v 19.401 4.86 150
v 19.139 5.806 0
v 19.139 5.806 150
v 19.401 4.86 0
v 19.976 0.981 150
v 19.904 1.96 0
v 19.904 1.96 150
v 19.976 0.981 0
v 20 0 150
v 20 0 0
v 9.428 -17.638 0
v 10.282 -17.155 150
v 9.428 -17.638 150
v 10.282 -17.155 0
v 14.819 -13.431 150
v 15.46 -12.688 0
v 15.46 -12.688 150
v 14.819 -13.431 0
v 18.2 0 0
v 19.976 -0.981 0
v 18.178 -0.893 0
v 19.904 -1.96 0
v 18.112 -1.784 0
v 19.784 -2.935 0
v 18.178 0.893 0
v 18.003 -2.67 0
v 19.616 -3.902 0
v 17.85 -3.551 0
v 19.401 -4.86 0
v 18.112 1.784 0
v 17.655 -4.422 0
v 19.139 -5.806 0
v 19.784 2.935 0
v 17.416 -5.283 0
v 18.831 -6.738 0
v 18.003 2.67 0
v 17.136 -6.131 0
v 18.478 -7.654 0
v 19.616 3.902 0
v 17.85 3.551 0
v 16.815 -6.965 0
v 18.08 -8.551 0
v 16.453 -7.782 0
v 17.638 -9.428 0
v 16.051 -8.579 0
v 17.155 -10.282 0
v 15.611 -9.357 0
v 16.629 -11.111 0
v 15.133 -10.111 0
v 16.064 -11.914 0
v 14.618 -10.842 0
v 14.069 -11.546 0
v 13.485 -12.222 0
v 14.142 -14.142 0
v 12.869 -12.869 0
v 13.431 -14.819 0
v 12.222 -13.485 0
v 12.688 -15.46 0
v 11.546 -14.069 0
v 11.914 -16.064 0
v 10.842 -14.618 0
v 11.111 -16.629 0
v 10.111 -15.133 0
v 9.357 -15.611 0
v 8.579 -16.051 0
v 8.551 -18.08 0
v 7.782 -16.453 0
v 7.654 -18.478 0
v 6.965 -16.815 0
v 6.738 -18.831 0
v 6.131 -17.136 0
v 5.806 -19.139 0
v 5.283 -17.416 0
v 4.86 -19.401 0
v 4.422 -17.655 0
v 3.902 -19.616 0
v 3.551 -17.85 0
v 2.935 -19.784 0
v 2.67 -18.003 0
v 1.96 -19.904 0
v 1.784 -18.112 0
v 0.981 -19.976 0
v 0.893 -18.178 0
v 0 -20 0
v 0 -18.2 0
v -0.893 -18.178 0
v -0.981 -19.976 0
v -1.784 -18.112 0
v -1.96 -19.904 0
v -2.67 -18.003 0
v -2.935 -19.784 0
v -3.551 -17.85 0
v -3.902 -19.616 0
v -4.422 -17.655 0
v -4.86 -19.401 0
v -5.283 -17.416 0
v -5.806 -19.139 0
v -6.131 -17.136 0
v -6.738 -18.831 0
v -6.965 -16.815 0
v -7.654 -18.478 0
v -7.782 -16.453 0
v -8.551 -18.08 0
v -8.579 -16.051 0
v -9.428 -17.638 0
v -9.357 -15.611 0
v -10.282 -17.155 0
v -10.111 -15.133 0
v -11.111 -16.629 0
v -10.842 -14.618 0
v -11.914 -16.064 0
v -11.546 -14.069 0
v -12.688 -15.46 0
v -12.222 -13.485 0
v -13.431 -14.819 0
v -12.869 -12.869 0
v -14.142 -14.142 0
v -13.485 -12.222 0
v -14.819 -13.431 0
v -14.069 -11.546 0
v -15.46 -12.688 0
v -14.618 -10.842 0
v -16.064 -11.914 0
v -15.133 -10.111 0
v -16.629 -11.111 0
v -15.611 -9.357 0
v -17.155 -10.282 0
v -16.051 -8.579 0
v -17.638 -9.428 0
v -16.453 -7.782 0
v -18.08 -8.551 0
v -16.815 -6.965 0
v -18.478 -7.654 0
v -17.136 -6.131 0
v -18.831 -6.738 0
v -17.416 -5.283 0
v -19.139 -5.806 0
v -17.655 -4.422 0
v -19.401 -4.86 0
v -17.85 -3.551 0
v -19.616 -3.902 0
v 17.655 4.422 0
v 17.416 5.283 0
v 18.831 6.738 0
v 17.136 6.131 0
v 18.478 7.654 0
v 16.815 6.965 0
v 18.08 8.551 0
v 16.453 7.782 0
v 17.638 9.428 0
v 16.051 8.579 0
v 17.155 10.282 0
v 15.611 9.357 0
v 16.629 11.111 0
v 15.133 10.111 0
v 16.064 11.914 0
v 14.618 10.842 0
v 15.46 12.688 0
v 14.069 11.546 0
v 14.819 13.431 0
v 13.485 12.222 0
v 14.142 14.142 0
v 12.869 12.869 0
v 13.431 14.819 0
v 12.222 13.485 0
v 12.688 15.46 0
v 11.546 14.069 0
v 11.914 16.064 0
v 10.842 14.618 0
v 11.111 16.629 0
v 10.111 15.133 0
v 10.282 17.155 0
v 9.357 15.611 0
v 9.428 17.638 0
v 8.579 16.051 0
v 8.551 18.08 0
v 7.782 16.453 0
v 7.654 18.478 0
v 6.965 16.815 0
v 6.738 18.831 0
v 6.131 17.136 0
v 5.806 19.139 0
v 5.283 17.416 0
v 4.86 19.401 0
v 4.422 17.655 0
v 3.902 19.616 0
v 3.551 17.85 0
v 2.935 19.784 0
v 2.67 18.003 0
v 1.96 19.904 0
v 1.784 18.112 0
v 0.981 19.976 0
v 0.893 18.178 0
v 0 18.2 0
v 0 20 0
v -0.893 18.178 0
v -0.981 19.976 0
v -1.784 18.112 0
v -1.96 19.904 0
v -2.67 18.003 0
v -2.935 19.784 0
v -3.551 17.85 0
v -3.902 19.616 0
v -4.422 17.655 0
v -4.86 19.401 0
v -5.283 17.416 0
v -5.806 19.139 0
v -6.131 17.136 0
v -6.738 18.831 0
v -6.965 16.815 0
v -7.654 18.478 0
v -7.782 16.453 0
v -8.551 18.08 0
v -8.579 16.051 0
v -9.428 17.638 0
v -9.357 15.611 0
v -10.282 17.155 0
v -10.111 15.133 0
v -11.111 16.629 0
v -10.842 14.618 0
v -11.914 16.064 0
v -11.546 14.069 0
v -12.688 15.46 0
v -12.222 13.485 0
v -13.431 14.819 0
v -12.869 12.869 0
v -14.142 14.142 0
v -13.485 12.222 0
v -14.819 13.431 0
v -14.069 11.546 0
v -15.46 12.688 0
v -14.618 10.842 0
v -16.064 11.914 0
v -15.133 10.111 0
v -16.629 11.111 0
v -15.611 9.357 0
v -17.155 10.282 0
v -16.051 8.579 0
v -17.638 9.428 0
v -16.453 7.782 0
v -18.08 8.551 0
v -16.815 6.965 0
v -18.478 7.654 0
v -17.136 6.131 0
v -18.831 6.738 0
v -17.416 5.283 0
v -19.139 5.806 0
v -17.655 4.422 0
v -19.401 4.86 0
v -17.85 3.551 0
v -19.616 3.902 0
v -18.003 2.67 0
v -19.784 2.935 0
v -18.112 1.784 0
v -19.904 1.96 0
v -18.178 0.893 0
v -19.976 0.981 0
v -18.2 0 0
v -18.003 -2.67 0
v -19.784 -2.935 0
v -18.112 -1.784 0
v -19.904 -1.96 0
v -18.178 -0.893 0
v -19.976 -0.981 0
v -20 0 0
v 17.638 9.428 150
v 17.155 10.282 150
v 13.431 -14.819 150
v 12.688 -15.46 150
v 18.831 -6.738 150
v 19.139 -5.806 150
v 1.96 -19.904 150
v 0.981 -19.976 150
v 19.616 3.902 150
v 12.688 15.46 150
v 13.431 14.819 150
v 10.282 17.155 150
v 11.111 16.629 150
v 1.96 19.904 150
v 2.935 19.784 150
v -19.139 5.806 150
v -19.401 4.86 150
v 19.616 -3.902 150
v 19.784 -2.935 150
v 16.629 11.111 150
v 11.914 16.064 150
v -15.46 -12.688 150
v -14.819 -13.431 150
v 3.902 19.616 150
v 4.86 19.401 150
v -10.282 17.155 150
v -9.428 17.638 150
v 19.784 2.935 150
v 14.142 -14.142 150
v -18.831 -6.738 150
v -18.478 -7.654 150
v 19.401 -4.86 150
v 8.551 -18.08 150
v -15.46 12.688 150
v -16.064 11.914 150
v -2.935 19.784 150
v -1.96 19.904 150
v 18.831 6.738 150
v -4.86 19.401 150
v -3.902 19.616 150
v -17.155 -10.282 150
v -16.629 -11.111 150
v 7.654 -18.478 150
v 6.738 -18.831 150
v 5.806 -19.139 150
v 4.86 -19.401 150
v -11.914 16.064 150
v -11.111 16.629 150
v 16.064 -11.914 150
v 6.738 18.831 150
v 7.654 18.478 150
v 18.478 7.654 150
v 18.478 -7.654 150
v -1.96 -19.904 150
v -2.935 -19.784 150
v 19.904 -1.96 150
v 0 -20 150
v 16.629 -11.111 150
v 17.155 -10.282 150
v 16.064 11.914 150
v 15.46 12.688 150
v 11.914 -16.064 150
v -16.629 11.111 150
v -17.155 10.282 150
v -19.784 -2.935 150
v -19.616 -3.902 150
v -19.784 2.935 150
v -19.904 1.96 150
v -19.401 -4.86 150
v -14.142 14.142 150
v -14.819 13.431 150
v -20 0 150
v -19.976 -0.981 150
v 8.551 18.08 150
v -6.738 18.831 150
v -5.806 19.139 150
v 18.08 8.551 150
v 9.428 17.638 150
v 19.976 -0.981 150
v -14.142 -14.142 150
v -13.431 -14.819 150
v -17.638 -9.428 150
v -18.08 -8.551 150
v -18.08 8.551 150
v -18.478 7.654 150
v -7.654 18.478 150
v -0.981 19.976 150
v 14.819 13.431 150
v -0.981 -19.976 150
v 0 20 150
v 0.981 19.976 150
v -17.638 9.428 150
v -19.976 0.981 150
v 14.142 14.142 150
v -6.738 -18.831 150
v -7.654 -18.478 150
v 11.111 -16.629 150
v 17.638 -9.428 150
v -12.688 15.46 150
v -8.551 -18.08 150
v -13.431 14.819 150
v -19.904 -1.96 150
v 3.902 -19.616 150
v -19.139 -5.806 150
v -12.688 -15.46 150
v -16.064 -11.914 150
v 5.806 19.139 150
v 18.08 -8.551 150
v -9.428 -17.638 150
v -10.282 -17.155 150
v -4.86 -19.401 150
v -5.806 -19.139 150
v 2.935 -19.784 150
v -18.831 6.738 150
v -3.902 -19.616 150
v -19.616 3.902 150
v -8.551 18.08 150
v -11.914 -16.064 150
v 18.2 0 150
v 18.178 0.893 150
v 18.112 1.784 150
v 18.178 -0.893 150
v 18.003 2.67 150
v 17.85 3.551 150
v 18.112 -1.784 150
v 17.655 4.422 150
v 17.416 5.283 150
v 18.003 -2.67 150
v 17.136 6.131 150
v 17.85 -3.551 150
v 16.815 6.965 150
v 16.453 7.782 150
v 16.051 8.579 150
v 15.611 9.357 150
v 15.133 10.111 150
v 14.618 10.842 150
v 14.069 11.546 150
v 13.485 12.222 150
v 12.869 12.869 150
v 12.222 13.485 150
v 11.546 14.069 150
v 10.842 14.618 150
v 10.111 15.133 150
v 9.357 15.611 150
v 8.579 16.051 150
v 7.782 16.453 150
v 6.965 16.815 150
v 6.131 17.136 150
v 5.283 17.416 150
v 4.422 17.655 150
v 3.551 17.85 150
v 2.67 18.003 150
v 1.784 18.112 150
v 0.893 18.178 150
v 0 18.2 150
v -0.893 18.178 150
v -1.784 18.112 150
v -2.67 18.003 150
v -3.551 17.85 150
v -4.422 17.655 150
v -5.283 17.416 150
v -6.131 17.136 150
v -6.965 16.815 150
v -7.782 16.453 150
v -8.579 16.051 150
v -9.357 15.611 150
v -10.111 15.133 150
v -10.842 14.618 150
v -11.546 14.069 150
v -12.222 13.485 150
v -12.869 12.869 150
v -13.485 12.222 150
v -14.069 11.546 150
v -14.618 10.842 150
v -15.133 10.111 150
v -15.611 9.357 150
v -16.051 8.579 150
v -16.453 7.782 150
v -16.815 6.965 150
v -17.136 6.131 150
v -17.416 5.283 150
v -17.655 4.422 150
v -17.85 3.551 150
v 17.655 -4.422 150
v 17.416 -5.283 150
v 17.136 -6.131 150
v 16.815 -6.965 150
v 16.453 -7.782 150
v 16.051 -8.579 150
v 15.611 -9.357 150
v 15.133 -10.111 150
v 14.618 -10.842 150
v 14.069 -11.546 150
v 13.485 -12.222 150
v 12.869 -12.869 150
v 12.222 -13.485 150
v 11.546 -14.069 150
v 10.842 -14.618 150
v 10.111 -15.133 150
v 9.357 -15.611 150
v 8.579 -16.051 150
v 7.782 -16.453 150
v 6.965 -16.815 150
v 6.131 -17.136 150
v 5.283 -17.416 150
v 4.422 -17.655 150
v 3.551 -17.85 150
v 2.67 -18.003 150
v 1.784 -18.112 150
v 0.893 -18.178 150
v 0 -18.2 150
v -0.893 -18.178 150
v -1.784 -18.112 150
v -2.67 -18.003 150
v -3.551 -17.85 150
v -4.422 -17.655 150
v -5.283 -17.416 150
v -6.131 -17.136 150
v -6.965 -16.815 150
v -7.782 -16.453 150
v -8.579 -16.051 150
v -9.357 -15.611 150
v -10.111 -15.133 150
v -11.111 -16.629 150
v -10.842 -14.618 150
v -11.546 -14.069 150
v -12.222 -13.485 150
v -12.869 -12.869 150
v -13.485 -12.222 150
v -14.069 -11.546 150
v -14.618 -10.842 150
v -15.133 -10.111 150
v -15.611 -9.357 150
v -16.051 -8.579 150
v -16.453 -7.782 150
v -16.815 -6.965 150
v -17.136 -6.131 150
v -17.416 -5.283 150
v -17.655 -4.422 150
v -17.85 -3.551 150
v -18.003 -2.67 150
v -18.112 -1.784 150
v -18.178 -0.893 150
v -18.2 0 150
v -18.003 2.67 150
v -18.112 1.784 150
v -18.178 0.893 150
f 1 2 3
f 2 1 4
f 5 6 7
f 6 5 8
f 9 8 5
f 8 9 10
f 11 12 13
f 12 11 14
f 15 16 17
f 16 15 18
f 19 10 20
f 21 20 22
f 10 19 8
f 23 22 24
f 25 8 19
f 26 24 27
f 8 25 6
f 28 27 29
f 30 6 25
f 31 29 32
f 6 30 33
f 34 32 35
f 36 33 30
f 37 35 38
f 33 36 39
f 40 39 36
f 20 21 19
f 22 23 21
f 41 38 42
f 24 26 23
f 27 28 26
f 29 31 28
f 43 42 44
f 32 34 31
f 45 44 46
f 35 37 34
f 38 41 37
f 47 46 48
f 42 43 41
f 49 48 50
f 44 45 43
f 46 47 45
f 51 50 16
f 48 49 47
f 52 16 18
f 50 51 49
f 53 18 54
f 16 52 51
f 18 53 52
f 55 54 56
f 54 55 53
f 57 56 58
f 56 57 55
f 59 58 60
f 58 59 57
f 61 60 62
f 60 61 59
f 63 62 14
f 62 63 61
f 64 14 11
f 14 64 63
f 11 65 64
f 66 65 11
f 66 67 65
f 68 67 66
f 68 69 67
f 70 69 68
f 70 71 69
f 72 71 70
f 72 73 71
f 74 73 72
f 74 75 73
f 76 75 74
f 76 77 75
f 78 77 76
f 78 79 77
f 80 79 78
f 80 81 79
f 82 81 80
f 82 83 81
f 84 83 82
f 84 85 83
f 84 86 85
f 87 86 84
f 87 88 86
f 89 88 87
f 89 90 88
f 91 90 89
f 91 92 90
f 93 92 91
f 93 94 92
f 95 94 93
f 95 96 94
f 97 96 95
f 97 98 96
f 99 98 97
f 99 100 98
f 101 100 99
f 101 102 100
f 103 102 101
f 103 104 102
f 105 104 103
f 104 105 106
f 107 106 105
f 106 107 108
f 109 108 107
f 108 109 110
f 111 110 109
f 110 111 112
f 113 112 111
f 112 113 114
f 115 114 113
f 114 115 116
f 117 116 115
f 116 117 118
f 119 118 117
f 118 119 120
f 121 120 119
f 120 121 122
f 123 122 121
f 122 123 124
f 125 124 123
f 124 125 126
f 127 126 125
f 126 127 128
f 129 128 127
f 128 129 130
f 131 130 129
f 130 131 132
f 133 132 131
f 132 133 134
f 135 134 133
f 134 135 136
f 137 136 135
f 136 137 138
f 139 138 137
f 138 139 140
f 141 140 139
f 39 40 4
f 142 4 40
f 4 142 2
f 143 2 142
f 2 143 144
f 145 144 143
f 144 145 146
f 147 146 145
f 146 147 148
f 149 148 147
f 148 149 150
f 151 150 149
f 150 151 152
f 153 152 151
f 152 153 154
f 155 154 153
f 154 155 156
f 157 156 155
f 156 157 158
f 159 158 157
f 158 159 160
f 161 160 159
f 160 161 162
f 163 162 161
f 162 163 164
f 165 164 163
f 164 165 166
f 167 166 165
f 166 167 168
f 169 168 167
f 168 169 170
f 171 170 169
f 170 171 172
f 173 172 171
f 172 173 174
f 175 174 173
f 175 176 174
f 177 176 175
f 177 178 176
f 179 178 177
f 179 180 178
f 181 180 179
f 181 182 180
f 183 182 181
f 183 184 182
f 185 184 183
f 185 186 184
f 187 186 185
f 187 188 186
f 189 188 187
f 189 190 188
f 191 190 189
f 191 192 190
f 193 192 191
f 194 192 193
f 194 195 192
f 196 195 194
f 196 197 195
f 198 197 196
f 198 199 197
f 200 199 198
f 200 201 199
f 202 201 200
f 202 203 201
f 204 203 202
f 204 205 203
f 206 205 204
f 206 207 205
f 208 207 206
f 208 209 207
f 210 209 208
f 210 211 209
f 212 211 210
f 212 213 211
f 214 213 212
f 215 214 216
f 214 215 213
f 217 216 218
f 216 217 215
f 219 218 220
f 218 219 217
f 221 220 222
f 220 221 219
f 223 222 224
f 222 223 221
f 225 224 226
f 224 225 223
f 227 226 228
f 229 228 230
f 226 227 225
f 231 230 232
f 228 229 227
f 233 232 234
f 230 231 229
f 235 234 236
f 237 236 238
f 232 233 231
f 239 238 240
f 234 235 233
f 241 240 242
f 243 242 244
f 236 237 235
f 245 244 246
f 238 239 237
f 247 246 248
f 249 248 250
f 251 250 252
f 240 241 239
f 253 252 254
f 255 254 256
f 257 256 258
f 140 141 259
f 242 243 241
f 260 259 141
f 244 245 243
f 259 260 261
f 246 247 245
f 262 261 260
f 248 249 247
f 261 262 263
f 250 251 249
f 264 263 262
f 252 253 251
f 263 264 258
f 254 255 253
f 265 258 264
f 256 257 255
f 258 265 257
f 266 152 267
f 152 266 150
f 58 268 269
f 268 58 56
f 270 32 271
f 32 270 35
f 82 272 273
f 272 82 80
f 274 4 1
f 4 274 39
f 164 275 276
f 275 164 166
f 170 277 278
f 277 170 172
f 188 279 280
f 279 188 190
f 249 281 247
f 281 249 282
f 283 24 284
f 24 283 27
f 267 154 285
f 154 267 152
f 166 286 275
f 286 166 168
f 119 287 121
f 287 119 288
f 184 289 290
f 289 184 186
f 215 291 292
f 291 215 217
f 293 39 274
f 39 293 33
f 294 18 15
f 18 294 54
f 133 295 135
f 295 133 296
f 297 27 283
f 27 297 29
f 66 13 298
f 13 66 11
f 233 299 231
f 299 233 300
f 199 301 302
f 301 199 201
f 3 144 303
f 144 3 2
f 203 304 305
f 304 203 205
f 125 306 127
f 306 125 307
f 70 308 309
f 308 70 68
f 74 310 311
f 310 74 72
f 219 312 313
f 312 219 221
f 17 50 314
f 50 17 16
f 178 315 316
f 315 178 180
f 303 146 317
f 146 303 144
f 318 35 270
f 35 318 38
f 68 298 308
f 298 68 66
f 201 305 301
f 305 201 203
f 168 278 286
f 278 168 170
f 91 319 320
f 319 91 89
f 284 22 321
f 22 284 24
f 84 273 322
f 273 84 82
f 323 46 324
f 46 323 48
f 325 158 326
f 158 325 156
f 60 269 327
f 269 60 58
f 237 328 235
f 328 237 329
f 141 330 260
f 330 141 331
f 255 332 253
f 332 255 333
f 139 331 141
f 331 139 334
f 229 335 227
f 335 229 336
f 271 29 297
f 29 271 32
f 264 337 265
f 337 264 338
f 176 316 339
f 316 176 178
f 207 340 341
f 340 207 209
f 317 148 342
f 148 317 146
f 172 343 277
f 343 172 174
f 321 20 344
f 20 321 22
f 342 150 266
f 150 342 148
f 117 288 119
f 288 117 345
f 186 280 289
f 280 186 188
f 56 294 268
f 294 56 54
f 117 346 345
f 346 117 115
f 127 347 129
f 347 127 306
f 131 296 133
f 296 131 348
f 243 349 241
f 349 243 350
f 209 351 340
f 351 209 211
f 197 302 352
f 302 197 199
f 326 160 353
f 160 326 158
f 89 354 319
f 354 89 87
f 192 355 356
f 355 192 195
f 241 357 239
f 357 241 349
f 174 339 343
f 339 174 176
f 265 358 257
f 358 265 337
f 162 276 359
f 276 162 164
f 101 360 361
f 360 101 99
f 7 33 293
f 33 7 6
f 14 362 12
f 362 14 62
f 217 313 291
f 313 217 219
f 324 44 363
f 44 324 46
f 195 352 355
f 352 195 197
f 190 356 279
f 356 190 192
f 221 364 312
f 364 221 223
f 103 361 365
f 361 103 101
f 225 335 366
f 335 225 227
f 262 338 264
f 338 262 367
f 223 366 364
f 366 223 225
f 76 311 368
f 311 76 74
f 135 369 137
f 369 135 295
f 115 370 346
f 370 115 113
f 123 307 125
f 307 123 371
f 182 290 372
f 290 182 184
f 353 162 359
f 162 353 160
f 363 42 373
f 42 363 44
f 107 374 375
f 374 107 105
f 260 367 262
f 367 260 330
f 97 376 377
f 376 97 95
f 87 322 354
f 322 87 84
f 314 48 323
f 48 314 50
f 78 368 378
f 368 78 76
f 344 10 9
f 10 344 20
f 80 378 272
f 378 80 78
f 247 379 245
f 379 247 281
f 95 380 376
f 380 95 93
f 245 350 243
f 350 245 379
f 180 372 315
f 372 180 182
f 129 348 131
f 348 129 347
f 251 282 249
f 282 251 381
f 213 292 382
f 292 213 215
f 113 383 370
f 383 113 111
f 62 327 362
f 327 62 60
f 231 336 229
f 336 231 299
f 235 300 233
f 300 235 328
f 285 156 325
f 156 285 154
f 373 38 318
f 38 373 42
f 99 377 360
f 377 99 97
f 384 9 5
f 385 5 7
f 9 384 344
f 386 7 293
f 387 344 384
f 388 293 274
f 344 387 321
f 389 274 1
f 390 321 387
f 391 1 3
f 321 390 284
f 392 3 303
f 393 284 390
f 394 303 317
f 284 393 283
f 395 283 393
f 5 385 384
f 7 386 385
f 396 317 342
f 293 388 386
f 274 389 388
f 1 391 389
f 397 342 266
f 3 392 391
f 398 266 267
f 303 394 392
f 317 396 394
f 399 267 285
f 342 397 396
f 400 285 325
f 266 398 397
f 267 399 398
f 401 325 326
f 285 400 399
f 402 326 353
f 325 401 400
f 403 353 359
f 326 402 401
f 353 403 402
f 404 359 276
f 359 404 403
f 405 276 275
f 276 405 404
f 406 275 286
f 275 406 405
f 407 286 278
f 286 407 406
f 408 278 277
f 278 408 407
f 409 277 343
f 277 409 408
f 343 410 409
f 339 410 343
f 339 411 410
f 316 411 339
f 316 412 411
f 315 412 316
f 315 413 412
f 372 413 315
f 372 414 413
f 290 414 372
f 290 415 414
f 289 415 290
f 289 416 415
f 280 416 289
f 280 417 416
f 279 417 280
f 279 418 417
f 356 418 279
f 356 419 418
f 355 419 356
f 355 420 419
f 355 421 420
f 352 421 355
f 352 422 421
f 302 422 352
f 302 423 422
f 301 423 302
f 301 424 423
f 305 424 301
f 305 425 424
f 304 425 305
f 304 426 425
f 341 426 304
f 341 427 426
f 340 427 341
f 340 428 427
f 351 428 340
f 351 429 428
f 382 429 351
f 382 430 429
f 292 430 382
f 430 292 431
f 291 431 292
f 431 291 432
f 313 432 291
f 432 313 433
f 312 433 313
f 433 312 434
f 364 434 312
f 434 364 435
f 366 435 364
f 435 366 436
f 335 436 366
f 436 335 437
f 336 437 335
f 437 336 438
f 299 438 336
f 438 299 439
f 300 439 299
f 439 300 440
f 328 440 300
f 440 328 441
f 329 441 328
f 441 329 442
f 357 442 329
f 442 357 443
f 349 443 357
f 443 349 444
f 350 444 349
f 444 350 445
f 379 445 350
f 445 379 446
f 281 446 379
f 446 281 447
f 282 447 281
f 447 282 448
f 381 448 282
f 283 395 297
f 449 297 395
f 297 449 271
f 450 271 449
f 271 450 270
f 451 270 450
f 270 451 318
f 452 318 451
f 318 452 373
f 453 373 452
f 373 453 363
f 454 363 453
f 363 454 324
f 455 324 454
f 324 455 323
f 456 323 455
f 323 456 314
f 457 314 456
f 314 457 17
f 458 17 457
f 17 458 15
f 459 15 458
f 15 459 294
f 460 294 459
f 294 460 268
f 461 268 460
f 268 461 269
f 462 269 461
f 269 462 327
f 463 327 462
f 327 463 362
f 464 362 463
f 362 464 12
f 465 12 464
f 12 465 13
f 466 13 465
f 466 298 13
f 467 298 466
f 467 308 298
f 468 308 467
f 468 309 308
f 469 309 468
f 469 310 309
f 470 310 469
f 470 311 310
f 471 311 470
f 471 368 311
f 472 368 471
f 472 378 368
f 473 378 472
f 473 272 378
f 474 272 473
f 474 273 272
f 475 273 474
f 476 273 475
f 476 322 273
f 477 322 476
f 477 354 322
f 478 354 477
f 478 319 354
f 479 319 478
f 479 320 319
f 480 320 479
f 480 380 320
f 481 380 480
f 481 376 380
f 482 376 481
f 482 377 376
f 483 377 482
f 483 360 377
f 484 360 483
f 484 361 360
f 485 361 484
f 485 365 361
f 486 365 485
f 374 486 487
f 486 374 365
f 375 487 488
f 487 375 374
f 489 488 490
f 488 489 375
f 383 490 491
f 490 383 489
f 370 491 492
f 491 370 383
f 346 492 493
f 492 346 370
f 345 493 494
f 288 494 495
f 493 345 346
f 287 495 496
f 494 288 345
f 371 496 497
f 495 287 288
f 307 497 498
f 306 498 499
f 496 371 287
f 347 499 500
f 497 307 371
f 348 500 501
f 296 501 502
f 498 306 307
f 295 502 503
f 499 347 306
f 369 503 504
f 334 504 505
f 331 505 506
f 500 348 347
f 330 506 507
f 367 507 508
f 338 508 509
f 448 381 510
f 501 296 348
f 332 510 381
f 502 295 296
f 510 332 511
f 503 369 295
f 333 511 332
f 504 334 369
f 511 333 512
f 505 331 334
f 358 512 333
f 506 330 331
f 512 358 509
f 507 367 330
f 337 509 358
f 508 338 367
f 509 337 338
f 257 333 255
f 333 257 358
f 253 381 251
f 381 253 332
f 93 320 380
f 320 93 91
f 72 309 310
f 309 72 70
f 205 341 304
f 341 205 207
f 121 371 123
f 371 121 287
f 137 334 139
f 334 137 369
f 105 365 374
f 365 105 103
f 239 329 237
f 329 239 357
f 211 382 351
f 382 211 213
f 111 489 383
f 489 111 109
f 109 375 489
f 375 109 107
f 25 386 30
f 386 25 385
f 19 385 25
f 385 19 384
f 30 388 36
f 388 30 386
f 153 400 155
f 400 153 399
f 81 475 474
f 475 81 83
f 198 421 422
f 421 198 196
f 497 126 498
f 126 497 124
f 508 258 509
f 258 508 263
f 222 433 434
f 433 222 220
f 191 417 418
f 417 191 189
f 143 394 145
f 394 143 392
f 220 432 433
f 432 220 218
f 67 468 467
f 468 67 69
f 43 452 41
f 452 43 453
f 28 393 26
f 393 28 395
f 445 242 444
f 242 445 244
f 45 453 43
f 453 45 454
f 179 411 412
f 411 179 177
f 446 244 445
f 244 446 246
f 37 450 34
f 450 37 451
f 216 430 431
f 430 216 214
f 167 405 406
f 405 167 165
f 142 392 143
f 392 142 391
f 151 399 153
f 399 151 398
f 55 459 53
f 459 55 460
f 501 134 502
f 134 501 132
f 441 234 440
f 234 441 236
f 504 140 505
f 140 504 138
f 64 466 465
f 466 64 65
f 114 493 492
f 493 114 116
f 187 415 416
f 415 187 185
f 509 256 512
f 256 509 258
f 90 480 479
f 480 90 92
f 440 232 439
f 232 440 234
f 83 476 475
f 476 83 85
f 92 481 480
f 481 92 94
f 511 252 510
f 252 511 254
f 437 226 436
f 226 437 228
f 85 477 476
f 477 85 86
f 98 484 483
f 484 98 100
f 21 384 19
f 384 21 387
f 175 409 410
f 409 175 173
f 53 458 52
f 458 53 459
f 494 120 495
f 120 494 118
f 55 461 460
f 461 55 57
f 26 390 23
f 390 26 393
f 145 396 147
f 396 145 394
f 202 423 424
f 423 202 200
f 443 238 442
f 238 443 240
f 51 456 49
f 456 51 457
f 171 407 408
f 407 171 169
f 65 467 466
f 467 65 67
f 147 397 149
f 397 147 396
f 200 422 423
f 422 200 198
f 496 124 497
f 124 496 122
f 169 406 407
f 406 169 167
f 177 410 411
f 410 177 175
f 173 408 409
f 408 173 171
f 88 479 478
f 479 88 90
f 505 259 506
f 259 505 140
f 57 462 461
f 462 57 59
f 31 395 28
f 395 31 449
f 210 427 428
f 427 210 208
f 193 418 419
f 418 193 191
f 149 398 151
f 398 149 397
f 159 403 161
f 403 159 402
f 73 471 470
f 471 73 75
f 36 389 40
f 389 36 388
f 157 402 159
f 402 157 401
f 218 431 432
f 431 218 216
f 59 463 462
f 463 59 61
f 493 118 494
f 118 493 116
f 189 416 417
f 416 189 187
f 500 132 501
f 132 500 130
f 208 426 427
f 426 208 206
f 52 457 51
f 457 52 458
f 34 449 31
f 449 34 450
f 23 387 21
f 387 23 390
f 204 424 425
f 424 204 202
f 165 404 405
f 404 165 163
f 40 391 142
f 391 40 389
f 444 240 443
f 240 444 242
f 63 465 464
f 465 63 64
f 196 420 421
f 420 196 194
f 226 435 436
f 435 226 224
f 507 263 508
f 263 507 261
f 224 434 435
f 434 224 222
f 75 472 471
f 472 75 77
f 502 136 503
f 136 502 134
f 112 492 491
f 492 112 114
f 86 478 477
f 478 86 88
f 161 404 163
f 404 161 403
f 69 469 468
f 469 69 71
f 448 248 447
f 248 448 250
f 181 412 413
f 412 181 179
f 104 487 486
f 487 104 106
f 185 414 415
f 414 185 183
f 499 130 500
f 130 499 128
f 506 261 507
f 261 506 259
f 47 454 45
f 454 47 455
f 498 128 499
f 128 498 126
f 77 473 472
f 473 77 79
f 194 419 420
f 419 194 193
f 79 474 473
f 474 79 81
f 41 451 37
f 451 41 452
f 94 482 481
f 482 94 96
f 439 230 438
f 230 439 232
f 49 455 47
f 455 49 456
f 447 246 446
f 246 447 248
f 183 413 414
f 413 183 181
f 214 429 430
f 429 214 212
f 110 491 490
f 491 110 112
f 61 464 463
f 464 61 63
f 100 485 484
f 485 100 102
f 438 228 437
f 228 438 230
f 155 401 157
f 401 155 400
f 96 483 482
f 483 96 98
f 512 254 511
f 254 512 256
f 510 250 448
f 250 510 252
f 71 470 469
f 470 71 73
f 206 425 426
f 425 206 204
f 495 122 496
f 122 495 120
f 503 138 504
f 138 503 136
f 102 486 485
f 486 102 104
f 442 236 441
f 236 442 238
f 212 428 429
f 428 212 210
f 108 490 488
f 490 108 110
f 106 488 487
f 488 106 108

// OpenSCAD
$fn = 128;

// HT 40 pipe (approx.): DN40, OD 40 mm, length 150 mm
// Assumed wall thickness ~1.8 mm (typical for HT indoor drainage pipe)
od = 40;
wall = 1.8;
id = od - 2*wall;
len = 150;

difference() {
  cylinder(h = len, d = od);
  translate([0,0,-0.1])
    cylinder(h = len + 0.2, d = id);
}
